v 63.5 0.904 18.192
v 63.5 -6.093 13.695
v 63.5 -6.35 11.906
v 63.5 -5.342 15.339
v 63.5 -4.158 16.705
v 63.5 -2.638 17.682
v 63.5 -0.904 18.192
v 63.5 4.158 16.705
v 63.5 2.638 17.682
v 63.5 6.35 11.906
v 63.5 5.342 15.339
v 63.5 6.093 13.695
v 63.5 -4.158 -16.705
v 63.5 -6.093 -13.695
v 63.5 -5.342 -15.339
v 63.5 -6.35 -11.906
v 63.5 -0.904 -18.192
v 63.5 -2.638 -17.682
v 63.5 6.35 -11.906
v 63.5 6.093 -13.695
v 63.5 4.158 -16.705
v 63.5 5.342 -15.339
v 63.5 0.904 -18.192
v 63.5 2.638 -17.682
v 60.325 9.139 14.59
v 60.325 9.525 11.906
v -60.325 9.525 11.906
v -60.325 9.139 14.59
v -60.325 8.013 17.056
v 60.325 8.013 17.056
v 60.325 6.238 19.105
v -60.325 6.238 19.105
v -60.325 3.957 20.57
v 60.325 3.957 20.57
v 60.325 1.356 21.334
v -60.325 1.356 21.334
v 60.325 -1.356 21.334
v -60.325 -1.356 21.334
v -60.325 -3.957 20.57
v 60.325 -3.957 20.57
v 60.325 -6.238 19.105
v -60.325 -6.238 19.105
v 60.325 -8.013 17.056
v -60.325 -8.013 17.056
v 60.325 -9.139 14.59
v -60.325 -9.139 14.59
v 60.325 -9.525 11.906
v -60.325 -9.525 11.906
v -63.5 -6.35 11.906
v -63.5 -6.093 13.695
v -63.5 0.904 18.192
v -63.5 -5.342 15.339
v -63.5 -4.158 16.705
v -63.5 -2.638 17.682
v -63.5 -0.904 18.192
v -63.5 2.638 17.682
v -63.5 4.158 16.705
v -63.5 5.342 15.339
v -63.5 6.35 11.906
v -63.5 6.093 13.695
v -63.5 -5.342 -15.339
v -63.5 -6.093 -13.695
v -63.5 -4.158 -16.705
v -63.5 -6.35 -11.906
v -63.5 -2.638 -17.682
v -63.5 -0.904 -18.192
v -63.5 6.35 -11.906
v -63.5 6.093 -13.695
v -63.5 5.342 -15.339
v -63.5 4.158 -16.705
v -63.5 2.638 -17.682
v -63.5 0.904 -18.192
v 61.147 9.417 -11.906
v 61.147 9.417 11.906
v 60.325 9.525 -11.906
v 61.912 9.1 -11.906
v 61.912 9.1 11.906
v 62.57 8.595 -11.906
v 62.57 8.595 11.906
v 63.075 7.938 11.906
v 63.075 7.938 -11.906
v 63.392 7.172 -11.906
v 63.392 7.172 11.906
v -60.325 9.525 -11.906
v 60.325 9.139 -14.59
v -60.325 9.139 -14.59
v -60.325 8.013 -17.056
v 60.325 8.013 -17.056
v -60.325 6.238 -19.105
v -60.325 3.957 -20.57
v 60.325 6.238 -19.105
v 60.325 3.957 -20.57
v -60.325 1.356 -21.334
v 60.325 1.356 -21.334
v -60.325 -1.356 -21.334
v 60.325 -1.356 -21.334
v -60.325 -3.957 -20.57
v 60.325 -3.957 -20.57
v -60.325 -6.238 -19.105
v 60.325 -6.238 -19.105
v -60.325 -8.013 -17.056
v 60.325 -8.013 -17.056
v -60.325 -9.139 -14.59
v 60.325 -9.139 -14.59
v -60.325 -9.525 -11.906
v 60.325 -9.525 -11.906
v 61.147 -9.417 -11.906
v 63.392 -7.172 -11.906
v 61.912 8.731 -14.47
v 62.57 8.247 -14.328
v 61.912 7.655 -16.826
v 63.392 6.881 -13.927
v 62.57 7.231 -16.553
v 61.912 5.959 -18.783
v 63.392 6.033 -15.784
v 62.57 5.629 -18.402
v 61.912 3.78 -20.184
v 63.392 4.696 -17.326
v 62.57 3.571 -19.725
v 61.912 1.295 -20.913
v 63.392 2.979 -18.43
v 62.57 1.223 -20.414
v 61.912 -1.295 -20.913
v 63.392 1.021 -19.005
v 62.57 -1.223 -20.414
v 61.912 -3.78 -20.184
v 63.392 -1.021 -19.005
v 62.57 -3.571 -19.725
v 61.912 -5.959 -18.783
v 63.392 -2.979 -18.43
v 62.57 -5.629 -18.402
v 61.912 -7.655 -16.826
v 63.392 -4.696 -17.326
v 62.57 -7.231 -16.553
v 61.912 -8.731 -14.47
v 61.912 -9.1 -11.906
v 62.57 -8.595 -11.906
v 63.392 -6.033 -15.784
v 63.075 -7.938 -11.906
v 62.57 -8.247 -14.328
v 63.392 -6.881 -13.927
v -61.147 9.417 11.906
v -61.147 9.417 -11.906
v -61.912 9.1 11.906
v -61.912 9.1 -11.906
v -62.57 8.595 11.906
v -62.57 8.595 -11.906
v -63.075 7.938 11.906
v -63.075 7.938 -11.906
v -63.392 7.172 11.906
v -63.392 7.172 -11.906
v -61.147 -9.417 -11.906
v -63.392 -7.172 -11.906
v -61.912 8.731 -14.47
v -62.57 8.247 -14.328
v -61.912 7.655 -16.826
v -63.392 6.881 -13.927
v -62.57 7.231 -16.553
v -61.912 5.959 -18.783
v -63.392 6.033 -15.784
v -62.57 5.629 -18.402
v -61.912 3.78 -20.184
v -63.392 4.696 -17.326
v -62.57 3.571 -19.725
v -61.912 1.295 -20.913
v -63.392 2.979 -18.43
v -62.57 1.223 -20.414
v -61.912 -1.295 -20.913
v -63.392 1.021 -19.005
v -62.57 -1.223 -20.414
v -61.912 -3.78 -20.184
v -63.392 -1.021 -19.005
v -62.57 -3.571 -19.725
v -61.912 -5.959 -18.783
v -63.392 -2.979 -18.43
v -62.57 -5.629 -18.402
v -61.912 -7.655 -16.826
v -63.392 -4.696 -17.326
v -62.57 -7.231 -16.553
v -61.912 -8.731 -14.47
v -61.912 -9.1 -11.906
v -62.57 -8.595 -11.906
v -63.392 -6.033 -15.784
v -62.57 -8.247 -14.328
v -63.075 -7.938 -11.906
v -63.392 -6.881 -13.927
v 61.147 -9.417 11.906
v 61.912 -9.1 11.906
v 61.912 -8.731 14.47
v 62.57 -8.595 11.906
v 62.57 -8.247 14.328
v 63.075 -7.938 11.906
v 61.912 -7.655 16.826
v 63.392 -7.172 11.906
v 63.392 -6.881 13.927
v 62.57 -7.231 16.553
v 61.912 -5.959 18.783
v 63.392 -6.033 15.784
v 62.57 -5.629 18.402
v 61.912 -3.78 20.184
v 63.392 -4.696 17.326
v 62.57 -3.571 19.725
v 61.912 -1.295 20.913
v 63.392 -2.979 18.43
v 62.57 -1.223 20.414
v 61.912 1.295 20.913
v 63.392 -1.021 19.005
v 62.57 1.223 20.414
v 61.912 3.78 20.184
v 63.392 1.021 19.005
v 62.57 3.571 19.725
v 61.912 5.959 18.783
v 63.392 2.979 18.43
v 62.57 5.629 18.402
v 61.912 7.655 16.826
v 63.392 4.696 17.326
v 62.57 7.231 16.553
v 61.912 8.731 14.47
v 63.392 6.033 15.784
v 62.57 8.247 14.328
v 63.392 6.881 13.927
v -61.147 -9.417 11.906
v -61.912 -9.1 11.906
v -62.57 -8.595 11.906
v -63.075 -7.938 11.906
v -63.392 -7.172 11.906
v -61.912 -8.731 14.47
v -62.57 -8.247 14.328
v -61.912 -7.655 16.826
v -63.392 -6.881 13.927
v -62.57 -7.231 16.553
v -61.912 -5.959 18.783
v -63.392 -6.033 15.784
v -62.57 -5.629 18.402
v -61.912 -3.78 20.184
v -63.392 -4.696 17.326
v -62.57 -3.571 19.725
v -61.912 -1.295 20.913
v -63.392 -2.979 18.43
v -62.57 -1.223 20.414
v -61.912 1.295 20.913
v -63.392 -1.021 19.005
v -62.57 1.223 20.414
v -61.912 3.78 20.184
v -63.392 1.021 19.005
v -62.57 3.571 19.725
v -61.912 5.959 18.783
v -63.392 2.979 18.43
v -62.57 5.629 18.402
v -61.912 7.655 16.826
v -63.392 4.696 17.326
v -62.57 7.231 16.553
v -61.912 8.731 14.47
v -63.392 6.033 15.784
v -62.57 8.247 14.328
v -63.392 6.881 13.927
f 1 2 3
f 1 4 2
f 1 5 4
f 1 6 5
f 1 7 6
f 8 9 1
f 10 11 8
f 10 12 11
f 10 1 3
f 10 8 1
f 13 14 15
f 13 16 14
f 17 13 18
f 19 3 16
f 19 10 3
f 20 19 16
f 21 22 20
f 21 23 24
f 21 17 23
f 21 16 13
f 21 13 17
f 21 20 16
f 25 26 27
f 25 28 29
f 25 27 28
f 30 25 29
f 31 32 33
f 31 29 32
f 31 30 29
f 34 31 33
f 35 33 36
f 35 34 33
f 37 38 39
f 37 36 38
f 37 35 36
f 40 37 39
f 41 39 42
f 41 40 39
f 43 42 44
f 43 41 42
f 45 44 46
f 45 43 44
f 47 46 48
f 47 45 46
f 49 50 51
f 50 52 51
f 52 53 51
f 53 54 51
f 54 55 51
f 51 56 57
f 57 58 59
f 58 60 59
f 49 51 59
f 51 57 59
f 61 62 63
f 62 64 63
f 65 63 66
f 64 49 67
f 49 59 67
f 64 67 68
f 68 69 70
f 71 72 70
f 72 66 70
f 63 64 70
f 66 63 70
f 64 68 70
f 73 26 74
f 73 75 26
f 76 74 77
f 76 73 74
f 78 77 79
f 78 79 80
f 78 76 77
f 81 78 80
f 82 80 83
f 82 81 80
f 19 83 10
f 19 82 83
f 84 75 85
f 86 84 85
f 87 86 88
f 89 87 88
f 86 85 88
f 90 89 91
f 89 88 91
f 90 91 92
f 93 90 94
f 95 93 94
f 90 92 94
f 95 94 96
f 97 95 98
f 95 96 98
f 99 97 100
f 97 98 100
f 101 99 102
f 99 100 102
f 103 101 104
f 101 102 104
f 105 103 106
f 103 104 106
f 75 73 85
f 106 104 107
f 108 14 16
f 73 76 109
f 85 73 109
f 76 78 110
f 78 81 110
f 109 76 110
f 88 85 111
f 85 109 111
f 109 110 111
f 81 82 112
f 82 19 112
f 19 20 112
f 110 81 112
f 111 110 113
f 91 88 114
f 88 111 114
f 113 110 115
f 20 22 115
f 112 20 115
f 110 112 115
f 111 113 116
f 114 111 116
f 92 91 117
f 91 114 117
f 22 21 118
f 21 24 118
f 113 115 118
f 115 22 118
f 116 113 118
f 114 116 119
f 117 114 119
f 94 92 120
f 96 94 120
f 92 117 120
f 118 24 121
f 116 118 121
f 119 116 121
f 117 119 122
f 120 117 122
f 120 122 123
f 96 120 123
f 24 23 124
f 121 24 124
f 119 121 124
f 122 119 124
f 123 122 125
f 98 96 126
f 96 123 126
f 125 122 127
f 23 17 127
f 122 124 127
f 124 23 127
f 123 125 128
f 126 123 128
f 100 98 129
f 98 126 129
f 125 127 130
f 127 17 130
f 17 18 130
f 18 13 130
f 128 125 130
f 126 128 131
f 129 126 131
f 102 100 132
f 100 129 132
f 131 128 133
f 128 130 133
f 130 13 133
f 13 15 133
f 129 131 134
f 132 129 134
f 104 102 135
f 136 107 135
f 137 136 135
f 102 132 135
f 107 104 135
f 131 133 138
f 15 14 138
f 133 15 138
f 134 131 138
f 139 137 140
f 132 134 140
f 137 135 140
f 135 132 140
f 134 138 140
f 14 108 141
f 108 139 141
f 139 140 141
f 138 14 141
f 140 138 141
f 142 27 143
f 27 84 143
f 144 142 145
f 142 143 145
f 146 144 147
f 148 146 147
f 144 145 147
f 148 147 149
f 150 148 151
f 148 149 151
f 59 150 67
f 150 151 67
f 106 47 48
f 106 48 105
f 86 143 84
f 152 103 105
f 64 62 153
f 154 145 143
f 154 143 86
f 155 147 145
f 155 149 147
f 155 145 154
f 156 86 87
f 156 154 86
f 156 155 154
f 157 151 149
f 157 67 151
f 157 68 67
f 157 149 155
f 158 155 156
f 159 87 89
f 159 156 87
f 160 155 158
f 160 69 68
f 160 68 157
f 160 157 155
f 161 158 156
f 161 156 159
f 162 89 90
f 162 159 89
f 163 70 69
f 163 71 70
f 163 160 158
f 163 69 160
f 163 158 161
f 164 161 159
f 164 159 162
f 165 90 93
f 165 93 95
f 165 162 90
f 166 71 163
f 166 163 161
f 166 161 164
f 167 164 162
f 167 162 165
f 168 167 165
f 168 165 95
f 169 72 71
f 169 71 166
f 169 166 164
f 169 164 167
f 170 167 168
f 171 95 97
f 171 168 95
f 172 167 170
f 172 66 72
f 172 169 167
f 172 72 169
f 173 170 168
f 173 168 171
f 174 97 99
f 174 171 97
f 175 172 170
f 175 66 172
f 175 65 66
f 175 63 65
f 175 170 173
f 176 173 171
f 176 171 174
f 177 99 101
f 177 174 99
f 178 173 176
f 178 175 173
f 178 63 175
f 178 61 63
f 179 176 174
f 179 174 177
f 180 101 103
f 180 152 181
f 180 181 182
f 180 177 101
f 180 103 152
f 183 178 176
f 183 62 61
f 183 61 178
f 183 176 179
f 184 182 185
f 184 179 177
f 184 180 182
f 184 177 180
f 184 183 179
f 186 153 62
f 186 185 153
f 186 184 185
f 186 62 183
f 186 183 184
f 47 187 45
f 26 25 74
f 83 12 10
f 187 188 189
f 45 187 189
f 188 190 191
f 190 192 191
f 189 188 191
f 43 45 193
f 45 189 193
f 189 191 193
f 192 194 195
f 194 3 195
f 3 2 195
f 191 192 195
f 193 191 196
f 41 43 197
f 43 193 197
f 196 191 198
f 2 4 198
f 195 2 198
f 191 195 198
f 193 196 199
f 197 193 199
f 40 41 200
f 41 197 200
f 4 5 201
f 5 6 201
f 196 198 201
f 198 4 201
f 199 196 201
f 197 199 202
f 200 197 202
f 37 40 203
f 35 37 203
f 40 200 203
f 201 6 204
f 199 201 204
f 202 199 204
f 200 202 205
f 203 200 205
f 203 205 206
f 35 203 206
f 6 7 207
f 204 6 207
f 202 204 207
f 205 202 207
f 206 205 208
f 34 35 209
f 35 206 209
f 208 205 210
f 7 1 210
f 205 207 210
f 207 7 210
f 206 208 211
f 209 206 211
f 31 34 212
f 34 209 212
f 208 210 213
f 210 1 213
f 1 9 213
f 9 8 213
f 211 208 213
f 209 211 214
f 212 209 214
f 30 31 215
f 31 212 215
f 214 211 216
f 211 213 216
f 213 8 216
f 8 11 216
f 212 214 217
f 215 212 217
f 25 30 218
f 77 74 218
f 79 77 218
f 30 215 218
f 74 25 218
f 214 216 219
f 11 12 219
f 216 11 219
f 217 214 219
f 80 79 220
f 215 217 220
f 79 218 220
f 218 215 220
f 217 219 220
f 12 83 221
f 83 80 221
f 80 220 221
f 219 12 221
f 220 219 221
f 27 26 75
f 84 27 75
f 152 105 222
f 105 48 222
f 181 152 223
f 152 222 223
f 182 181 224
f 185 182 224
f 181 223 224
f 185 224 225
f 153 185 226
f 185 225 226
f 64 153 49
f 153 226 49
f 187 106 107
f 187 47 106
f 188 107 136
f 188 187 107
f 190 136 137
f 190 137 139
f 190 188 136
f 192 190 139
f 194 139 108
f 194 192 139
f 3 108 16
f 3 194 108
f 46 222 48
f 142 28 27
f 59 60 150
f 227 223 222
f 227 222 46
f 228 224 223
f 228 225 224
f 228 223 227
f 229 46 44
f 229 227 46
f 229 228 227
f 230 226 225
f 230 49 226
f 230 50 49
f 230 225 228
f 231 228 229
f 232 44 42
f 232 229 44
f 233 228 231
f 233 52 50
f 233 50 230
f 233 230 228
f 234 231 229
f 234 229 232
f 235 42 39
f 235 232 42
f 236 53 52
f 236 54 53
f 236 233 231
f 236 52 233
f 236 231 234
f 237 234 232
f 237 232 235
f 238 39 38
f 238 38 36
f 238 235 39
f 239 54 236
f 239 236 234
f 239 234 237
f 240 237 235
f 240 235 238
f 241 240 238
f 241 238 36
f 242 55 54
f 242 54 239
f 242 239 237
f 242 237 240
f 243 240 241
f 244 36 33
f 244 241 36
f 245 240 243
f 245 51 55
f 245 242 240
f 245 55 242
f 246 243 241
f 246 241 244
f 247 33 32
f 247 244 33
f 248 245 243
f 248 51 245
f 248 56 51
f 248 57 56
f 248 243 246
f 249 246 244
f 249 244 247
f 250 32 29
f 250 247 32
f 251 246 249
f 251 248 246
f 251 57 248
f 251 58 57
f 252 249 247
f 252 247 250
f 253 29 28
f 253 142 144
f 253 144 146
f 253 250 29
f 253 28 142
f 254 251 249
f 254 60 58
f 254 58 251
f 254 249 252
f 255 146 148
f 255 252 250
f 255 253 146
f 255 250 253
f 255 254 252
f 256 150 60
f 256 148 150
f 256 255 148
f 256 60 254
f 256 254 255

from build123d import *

# Parameters (mm, degrees)
SKETCH1_W           = 23.8125
SKETCH1_H           = 19.05
BOSS_EXTRUDE1_DEPTH = 63.5
FILLET1_R           = 3.175


with BuildPart() as part:
    # Sketch1 → Boss-Extrude1 (new body, symmetric)
    with BuildSketch(Plane(origin=(0, 0, 0), x_dir=(0, 0, -1), z_dir=(1, 0, 0))):
        with BuildLine():
            Line((-11.90625, -9.525), (-11.90625, 9.525))
            ThreePointArc((-11.90625, 9.525), (-21.43125, 0), (-11.90625, -9.525))
        make_face()
        Rectangle(SKETCH1_W, SKETCH1_H)
        with BuildLine():
            ThreePointArc((11.90625, 9.525), (21.43125, 0), (11.90625, -9.525))
            Line((11.90625, -9.525), (11.90625, 9.525))
        make_face()
    extrude(amount=BOSS_EXTRUDE1_DEPTH, both=True)

    # Fillet1
    fillet1_edges = [part.edges().sort_by_distance(p)[0] for p in [
        (63.5, 0, -21.43125),
        (63.5, 9.525, 0),
        (63.5, 0, 21.43125),
        (-63.5, 9.525, 0),
        (-63.5, 0, -21.43125),
        (-63.5, -9.525, 0),
        (-63.5, 0, 21.43125),
        (63.5, -9.525, 0),
    ]]
    fillet(fillet1_edges, radius=FILLET1_R)


solid = part.part
